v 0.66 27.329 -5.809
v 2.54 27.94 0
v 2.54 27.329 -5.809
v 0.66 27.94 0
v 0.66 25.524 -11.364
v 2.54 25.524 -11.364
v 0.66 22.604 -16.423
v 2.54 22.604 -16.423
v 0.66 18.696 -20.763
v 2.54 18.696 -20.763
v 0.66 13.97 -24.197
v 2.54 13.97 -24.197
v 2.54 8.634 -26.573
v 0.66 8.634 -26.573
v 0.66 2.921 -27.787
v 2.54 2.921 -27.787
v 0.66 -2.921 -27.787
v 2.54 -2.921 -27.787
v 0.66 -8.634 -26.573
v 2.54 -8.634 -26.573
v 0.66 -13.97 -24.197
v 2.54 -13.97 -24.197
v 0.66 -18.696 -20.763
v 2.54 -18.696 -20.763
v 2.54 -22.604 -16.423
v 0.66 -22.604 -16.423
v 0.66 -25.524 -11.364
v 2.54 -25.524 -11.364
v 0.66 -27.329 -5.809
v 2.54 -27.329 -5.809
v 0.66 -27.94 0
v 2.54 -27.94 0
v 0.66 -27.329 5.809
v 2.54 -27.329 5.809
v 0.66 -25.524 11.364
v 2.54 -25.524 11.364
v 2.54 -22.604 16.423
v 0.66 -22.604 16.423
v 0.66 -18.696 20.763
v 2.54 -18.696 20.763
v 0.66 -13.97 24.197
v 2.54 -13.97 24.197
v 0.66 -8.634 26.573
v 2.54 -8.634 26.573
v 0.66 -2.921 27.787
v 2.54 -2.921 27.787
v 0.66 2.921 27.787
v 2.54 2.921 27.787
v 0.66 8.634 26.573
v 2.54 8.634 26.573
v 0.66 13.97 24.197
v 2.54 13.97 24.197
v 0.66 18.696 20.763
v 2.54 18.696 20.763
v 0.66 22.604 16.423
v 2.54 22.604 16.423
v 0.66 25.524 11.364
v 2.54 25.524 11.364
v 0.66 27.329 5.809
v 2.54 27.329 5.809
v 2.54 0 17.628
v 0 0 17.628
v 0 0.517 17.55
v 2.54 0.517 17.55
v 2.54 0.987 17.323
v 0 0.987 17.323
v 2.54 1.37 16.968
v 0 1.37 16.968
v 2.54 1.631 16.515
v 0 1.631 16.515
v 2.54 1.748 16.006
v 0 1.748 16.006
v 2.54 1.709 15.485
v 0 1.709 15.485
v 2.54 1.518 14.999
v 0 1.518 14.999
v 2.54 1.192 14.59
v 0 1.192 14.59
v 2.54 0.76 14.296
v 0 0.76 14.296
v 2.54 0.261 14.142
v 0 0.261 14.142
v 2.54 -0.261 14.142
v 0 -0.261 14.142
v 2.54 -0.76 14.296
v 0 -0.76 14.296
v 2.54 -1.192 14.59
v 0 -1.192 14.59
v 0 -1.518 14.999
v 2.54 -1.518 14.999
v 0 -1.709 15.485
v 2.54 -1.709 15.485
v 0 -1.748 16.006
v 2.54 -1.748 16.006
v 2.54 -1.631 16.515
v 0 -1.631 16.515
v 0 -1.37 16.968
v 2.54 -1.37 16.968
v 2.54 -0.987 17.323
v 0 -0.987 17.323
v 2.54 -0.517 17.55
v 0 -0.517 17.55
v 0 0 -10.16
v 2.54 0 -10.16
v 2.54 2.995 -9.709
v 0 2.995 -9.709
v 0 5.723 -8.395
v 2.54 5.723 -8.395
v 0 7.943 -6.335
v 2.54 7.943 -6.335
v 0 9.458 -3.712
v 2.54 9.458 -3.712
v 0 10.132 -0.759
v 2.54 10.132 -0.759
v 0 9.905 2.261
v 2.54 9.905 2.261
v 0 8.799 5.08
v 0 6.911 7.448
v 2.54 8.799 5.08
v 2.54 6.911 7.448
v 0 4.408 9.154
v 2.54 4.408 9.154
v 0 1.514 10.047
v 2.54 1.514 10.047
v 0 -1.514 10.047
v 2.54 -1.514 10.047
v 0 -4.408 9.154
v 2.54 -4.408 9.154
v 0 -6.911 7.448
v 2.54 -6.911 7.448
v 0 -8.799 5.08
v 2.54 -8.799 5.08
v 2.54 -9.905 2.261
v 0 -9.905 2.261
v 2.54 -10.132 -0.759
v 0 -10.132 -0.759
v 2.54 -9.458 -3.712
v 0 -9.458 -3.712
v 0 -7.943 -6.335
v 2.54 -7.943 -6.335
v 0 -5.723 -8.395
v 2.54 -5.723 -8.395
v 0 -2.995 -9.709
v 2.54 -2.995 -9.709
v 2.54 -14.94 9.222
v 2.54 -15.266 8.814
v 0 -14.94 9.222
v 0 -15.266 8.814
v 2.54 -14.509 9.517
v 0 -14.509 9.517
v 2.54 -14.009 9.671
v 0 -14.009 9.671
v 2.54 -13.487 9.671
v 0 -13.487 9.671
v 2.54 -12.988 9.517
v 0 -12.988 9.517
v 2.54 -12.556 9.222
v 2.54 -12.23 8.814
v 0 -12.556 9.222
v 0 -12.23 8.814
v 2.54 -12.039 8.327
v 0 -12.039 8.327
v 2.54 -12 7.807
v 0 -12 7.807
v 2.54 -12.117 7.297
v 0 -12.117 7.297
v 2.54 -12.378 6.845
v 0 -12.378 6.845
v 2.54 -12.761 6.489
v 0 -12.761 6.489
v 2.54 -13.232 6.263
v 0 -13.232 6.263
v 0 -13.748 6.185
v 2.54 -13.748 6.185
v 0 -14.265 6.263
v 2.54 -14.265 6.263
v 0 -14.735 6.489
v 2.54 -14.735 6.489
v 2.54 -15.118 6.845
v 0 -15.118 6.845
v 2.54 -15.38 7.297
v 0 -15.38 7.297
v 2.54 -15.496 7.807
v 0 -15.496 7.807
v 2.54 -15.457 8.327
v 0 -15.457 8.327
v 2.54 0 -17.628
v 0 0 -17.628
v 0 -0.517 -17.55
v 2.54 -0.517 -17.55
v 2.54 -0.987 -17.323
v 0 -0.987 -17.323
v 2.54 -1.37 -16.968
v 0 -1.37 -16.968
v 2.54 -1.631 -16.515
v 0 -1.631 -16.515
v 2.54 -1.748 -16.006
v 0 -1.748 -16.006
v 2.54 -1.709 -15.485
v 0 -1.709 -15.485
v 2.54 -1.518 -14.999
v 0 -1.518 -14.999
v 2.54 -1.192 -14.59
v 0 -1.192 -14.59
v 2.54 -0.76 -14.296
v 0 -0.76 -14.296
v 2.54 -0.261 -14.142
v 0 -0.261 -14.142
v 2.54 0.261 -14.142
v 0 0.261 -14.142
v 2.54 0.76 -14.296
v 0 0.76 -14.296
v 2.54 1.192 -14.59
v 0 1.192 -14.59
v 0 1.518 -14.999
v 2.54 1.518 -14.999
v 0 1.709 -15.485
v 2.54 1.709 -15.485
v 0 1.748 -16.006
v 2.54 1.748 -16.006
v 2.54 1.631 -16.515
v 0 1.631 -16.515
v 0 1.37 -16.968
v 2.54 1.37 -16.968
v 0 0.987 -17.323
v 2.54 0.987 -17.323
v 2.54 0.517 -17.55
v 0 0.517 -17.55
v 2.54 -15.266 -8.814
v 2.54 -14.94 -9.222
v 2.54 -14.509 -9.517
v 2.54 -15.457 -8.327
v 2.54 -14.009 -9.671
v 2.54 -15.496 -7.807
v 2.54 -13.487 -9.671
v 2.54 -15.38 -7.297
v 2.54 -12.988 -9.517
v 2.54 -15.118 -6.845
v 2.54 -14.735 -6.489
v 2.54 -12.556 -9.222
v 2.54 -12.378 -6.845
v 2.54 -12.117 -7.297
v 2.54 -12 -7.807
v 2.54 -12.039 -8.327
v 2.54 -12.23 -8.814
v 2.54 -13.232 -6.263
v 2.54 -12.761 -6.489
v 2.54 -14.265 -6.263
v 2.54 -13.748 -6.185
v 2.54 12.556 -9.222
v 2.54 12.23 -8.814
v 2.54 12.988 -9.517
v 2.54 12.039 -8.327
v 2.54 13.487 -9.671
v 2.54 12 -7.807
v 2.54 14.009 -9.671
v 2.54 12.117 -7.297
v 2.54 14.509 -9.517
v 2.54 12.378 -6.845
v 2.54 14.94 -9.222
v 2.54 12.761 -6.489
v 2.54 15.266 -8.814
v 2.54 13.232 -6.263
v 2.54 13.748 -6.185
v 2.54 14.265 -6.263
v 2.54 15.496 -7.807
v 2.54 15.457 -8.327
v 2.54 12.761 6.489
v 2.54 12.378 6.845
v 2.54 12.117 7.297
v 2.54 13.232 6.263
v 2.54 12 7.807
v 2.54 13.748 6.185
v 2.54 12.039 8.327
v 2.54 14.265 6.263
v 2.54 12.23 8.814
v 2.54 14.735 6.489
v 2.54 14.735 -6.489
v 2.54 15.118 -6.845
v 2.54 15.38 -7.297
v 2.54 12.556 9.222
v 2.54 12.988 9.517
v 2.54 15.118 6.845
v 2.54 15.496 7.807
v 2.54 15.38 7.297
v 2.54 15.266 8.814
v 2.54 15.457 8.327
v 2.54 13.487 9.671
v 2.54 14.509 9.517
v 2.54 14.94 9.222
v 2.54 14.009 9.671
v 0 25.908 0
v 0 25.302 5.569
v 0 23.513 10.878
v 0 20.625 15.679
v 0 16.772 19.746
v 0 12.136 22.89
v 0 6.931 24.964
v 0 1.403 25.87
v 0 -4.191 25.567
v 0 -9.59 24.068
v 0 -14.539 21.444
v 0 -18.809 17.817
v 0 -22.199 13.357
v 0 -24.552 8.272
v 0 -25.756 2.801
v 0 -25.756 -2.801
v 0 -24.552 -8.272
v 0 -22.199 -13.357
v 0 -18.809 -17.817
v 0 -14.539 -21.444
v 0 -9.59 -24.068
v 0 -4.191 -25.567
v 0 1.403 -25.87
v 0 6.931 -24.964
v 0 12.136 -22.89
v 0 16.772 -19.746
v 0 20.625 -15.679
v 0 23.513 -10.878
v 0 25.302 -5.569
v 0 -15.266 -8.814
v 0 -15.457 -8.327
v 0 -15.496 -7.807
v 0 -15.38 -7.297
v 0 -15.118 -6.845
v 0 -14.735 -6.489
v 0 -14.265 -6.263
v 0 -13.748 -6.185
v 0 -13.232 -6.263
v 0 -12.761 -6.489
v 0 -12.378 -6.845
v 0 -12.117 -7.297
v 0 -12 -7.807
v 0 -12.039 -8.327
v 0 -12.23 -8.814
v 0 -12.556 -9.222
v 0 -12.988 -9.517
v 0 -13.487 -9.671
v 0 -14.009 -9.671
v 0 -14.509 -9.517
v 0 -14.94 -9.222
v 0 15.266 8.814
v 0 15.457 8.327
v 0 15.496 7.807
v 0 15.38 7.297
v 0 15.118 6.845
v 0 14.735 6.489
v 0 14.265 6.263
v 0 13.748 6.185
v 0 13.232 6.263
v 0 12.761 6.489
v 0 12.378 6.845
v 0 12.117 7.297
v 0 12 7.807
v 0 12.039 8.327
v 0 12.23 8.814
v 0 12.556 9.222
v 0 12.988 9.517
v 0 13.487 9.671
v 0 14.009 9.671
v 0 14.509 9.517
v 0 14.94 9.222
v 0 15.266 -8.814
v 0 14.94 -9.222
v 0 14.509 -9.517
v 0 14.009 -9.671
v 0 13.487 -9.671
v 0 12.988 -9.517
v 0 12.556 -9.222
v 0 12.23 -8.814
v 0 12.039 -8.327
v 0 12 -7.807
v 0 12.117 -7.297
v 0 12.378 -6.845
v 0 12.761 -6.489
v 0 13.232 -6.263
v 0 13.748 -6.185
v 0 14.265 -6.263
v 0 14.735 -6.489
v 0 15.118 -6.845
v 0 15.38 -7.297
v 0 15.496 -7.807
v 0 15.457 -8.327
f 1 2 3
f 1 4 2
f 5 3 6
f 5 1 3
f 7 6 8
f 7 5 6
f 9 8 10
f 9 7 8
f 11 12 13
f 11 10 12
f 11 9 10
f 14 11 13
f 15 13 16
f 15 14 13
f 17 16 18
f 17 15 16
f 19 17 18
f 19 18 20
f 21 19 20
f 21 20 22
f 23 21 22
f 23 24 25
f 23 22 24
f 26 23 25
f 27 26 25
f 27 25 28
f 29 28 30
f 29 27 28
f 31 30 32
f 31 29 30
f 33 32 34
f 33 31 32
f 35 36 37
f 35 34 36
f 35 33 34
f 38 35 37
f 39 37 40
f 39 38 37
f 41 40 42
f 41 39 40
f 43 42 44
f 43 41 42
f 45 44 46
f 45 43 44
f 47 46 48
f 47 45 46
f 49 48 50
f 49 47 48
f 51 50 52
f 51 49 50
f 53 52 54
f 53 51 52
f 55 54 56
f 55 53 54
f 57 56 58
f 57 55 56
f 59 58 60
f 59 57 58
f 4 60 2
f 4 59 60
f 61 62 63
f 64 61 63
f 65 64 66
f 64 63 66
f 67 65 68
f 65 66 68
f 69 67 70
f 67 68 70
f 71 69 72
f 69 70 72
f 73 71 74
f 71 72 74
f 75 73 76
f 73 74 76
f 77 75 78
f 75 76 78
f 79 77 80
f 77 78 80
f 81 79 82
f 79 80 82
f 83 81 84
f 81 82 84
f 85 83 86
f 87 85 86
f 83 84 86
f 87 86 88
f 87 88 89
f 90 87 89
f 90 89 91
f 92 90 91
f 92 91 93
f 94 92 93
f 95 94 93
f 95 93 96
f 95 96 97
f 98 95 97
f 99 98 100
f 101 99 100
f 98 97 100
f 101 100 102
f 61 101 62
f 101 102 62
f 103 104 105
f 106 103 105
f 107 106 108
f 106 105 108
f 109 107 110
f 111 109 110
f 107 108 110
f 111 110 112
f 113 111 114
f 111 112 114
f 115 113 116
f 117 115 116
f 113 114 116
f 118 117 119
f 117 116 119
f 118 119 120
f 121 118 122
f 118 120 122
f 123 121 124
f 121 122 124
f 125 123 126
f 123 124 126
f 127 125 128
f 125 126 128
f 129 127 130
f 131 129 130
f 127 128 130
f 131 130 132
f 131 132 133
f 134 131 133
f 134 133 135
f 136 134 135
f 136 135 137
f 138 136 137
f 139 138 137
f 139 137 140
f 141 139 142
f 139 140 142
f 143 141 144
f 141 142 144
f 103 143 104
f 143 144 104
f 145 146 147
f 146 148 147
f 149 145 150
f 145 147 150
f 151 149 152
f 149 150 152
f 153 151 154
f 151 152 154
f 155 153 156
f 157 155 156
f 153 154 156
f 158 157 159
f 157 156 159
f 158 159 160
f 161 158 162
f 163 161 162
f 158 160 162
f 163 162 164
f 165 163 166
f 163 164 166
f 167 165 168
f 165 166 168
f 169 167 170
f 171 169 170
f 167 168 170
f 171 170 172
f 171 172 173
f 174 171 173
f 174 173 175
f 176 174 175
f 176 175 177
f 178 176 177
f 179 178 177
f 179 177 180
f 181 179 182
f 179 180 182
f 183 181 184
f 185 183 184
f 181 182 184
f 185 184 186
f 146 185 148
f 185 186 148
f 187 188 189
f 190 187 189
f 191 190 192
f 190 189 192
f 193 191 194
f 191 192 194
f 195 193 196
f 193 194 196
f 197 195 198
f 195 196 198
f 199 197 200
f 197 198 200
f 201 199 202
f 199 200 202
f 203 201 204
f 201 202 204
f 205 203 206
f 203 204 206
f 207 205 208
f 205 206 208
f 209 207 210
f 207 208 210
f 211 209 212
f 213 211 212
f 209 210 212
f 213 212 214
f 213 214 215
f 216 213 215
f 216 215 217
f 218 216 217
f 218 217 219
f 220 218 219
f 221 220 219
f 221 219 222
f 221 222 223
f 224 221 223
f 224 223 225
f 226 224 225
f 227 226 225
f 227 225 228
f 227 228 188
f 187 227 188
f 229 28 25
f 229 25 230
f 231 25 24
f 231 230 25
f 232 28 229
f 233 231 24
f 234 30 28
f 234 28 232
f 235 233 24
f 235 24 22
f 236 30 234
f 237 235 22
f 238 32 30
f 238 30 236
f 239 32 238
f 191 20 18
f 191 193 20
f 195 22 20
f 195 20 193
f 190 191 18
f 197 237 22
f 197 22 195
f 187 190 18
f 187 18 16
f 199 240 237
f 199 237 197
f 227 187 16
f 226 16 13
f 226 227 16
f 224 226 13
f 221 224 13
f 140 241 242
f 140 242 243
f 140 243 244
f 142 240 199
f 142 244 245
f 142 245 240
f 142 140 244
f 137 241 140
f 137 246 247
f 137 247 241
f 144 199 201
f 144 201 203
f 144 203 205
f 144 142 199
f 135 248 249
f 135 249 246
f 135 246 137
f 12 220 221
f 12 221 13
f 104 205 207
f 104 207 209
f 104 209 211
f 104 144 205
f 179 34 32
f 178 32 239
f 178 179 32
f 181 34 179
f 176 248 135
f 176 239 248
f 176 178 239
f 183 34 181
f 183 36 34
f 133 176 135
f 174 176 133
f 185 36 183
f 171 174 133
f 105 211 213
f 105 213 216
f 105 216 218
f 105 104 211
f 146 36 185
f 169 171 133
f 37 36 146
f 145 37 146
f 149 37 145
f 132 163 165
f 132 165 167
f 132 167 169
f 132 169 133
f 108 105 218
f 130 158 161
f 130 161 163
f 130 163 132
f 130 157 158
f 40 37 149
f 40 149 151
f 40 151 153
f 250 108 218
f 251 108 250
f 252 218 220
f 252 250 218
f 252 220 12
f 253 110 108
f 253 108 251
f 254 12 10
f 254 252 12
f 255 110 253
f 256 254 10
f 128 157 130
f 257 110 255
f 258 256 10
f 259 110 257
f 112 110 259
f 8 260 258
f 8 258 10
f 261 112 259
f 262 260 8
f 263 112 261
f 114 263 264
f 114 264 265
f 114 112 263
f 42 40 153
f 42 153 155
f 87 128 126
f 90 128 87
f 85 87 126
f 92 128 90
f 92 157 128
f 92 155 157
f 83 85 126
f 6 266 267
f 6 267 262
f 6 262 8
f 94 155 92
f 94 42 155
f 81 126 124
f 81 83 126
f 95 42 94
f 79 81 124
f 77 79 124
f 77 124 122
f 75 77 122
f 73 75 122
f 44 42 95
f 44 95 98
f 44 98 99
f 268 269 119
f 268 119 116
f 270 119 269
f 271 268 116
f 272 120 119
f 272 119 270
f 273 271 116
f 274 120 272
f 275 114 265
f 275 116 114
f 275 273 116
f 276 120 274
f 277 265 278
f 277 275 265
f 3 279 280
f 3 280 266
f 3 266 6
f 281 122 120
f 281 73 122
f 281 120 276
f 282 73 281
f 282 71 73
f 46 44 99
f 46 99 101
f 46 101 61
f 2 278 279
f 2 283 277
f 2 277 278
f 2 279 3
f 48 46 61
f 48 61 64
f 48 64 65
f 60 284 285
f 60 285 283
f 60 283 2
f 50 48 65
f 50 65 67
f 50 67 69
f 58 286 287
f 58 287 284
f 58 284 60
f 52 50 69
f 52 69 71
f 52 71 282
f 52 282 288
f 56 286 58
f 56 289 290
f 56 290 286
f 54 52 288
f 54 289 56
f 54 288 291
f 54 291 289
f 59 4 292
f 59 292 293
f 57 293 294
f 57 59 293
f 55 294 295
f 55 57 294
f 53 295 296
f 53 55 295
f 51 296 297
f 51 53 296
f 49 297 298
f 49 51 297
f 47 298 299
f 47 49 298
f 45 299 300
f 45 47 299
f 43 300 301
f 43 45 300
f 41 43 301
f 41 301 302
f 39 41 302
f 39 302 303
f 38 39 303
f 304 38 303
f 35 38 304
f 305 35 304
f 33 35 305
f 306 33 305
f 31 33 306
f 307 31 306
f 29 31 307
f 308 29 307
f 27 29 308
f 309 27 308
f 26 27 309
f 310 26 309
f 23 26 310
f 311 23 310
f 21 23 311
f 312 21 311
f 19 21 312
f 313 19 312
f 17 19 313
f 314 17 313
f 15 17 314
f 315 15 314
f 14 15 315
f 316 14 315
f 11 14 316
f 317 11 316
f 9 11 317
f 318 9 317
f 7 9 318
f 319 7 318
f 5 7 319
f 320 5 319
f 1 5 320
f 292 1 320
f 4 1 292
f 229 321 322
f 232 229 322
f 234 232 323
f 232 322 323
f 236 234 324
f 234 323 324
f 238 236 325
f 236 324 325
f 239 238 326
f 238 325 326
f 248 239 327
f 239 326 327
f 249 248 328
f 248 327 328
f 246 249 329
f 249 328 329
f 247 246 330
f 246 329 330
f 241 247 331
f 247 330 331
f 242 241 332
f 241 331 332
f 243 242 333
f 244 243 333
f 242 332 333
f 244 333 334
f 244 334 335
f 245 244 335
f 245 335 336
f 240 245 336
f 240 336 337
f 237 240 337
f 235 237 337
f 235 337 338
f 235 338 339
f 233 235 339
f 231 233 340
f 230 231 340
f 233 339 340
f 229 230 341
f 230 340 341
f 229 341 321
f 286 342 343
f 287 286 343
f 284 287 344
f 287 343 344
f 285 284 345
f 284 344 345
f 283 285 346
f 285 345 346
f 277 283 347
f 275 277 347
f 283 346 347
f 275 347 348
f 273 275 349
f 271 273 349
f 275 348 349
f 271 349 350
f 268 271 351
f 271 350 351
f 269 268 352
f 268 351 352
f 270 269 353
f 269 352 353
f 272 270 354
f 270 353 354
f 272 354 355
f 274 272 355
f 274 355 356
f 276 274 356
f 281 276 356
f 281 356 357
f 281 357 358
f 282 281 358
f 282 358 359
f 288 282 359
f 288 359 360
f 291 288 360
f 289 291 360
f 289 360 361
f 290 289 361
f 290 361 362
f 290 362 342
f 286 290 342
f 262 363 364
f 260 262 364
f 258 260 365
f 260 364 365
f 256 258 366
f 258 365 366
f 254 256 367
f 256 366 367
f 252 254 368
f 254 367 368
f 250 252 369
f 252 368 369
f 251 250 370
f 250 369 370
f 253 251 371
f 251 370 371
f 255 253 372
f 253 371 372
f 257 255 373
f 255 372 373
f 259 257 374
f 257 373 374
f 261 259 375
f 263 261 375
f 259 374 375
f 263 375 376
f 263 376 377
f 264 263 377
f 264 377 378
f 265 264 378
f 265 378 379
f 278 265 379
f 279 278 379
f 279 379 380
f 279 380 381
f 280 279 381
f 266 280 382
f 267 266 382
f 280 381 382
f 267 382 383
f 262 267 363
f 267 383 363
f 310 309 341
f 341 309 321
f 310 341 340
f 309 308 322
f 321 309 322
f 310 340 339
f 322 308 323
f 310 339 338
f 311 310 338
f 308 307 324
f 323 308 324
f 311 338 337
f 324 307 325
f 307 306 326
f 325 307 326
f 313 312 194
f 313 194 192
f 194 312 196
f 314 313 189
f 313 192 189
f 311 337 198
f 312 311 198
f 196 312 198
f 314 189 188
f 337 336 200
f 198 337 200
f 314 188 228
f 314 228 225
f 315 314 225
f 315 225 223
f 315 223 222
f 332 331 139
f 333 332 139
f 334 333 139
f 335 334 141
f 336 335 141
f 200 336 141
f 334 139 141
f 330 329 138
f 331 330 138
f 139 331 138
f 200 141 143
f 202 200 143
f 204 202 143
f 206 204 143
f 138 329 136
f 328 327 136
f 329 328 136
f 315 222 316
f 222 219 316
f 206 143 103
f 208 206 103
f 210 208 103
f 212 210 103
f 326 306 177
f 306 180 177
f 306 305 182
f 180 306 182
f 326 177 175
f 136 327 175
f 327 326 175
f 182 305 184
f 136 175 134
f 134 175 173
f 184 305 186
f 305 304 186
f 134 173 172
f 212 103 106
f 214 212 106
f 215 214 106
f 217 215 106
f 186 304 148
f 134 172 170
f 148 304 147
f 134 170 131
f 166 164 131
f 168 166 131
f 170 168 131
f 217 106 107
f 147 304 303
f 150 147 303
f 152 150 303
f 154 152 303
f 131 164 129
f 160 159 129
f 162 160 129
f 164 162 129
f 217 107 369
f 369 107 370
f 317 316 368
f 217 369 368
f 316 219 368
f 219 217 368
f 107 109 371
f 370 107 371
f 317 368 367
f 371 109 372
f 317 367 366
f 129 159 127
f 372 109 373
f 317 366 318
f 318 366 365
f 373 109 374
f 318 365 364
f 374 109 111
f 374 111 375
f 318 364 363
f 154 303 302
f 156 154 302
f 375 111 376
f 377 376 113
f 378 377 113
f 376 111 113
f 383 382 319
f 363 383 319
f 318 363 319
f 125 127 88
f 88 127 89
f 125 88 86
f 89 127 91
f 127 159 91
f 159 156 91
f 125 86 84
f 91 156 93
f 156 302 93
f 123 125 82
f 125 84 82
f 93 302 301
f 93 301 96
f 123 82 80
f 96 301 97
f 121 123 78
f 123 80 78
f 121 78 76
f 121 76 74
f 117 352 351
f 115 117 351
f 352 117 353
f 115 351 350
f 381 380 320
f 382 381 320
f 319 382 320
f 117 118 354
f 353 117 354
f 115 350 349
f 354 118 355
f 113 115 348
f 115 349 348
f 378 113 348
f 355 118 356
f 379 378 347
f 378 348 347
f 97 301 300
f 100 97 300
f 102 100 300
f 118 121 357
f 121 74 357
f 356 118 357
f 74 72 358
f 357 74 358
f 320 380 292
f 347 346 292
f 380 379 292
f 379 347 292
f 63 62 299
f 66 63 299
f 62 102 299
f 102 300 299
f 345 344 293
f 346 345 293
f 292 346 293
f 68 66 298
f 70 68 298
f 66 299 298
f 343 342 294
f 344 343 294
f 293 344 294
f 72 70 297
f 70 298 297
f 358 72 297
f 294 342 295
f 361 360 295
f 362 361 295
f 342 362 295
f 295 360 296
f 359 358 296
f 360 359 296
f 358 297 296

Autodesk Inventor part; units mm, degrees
ref_plane "YZ Plane" through (0, 0, 0) normal (1, 0, 0) x (0, 1, 0)
ref_plane "XZ Plane" through (0, 0, 0) normal (0, 1, 0) x (-1, 0, 0)
ref_plane "XY Plane" through (0, 0, 0) normal (0, 0, 1) x (1, 0, 0)
sketch "Sketch1" plane through (0, 0, 0) normal (1, 0, 0) x (0, 1, 0)
  circle A0 centre (0, 0) radius 27.94
  dimension "d0" = 55.88
extrude "Extrusion1" add sketch "Sketch1" along normal blind 2.54
sketch "Sketch3" plane through (2.54, 0, 0) normal (1, 0, 0) x (0, 0, -1)
  point P0 (0, 0)
  point P1 (15.875, 0)
  dimension "d6" = 15.875
hole "Hole1" at (2.54, 0, -15.875) direction (-1, 0, 0) diameter 3.5052 end through all
pattern_circular "Circular Pattern1" count 6 over 360 about axis through (-10, 0, 0) along (1, 0, 0) of "Hole1"
chamfer "Chamfer1" distance 2.032 angle 18 1 edges at (0, -27.94, 0) measured on face at (0, 4.0768, 2.3537)
sketch "Sketch4" plane through (2.54, 0, 0) normal (1, 0, 0) x (0, 0, -1)
  circle A0 centre (0, 0) radius 10.16
  dimension "d20" = 20.32
extrude "Extrusion3" cut sketch "Sketch4" against normal through all
properties part number "ScorpioSprocketFlange" material "ABS Plastic"
